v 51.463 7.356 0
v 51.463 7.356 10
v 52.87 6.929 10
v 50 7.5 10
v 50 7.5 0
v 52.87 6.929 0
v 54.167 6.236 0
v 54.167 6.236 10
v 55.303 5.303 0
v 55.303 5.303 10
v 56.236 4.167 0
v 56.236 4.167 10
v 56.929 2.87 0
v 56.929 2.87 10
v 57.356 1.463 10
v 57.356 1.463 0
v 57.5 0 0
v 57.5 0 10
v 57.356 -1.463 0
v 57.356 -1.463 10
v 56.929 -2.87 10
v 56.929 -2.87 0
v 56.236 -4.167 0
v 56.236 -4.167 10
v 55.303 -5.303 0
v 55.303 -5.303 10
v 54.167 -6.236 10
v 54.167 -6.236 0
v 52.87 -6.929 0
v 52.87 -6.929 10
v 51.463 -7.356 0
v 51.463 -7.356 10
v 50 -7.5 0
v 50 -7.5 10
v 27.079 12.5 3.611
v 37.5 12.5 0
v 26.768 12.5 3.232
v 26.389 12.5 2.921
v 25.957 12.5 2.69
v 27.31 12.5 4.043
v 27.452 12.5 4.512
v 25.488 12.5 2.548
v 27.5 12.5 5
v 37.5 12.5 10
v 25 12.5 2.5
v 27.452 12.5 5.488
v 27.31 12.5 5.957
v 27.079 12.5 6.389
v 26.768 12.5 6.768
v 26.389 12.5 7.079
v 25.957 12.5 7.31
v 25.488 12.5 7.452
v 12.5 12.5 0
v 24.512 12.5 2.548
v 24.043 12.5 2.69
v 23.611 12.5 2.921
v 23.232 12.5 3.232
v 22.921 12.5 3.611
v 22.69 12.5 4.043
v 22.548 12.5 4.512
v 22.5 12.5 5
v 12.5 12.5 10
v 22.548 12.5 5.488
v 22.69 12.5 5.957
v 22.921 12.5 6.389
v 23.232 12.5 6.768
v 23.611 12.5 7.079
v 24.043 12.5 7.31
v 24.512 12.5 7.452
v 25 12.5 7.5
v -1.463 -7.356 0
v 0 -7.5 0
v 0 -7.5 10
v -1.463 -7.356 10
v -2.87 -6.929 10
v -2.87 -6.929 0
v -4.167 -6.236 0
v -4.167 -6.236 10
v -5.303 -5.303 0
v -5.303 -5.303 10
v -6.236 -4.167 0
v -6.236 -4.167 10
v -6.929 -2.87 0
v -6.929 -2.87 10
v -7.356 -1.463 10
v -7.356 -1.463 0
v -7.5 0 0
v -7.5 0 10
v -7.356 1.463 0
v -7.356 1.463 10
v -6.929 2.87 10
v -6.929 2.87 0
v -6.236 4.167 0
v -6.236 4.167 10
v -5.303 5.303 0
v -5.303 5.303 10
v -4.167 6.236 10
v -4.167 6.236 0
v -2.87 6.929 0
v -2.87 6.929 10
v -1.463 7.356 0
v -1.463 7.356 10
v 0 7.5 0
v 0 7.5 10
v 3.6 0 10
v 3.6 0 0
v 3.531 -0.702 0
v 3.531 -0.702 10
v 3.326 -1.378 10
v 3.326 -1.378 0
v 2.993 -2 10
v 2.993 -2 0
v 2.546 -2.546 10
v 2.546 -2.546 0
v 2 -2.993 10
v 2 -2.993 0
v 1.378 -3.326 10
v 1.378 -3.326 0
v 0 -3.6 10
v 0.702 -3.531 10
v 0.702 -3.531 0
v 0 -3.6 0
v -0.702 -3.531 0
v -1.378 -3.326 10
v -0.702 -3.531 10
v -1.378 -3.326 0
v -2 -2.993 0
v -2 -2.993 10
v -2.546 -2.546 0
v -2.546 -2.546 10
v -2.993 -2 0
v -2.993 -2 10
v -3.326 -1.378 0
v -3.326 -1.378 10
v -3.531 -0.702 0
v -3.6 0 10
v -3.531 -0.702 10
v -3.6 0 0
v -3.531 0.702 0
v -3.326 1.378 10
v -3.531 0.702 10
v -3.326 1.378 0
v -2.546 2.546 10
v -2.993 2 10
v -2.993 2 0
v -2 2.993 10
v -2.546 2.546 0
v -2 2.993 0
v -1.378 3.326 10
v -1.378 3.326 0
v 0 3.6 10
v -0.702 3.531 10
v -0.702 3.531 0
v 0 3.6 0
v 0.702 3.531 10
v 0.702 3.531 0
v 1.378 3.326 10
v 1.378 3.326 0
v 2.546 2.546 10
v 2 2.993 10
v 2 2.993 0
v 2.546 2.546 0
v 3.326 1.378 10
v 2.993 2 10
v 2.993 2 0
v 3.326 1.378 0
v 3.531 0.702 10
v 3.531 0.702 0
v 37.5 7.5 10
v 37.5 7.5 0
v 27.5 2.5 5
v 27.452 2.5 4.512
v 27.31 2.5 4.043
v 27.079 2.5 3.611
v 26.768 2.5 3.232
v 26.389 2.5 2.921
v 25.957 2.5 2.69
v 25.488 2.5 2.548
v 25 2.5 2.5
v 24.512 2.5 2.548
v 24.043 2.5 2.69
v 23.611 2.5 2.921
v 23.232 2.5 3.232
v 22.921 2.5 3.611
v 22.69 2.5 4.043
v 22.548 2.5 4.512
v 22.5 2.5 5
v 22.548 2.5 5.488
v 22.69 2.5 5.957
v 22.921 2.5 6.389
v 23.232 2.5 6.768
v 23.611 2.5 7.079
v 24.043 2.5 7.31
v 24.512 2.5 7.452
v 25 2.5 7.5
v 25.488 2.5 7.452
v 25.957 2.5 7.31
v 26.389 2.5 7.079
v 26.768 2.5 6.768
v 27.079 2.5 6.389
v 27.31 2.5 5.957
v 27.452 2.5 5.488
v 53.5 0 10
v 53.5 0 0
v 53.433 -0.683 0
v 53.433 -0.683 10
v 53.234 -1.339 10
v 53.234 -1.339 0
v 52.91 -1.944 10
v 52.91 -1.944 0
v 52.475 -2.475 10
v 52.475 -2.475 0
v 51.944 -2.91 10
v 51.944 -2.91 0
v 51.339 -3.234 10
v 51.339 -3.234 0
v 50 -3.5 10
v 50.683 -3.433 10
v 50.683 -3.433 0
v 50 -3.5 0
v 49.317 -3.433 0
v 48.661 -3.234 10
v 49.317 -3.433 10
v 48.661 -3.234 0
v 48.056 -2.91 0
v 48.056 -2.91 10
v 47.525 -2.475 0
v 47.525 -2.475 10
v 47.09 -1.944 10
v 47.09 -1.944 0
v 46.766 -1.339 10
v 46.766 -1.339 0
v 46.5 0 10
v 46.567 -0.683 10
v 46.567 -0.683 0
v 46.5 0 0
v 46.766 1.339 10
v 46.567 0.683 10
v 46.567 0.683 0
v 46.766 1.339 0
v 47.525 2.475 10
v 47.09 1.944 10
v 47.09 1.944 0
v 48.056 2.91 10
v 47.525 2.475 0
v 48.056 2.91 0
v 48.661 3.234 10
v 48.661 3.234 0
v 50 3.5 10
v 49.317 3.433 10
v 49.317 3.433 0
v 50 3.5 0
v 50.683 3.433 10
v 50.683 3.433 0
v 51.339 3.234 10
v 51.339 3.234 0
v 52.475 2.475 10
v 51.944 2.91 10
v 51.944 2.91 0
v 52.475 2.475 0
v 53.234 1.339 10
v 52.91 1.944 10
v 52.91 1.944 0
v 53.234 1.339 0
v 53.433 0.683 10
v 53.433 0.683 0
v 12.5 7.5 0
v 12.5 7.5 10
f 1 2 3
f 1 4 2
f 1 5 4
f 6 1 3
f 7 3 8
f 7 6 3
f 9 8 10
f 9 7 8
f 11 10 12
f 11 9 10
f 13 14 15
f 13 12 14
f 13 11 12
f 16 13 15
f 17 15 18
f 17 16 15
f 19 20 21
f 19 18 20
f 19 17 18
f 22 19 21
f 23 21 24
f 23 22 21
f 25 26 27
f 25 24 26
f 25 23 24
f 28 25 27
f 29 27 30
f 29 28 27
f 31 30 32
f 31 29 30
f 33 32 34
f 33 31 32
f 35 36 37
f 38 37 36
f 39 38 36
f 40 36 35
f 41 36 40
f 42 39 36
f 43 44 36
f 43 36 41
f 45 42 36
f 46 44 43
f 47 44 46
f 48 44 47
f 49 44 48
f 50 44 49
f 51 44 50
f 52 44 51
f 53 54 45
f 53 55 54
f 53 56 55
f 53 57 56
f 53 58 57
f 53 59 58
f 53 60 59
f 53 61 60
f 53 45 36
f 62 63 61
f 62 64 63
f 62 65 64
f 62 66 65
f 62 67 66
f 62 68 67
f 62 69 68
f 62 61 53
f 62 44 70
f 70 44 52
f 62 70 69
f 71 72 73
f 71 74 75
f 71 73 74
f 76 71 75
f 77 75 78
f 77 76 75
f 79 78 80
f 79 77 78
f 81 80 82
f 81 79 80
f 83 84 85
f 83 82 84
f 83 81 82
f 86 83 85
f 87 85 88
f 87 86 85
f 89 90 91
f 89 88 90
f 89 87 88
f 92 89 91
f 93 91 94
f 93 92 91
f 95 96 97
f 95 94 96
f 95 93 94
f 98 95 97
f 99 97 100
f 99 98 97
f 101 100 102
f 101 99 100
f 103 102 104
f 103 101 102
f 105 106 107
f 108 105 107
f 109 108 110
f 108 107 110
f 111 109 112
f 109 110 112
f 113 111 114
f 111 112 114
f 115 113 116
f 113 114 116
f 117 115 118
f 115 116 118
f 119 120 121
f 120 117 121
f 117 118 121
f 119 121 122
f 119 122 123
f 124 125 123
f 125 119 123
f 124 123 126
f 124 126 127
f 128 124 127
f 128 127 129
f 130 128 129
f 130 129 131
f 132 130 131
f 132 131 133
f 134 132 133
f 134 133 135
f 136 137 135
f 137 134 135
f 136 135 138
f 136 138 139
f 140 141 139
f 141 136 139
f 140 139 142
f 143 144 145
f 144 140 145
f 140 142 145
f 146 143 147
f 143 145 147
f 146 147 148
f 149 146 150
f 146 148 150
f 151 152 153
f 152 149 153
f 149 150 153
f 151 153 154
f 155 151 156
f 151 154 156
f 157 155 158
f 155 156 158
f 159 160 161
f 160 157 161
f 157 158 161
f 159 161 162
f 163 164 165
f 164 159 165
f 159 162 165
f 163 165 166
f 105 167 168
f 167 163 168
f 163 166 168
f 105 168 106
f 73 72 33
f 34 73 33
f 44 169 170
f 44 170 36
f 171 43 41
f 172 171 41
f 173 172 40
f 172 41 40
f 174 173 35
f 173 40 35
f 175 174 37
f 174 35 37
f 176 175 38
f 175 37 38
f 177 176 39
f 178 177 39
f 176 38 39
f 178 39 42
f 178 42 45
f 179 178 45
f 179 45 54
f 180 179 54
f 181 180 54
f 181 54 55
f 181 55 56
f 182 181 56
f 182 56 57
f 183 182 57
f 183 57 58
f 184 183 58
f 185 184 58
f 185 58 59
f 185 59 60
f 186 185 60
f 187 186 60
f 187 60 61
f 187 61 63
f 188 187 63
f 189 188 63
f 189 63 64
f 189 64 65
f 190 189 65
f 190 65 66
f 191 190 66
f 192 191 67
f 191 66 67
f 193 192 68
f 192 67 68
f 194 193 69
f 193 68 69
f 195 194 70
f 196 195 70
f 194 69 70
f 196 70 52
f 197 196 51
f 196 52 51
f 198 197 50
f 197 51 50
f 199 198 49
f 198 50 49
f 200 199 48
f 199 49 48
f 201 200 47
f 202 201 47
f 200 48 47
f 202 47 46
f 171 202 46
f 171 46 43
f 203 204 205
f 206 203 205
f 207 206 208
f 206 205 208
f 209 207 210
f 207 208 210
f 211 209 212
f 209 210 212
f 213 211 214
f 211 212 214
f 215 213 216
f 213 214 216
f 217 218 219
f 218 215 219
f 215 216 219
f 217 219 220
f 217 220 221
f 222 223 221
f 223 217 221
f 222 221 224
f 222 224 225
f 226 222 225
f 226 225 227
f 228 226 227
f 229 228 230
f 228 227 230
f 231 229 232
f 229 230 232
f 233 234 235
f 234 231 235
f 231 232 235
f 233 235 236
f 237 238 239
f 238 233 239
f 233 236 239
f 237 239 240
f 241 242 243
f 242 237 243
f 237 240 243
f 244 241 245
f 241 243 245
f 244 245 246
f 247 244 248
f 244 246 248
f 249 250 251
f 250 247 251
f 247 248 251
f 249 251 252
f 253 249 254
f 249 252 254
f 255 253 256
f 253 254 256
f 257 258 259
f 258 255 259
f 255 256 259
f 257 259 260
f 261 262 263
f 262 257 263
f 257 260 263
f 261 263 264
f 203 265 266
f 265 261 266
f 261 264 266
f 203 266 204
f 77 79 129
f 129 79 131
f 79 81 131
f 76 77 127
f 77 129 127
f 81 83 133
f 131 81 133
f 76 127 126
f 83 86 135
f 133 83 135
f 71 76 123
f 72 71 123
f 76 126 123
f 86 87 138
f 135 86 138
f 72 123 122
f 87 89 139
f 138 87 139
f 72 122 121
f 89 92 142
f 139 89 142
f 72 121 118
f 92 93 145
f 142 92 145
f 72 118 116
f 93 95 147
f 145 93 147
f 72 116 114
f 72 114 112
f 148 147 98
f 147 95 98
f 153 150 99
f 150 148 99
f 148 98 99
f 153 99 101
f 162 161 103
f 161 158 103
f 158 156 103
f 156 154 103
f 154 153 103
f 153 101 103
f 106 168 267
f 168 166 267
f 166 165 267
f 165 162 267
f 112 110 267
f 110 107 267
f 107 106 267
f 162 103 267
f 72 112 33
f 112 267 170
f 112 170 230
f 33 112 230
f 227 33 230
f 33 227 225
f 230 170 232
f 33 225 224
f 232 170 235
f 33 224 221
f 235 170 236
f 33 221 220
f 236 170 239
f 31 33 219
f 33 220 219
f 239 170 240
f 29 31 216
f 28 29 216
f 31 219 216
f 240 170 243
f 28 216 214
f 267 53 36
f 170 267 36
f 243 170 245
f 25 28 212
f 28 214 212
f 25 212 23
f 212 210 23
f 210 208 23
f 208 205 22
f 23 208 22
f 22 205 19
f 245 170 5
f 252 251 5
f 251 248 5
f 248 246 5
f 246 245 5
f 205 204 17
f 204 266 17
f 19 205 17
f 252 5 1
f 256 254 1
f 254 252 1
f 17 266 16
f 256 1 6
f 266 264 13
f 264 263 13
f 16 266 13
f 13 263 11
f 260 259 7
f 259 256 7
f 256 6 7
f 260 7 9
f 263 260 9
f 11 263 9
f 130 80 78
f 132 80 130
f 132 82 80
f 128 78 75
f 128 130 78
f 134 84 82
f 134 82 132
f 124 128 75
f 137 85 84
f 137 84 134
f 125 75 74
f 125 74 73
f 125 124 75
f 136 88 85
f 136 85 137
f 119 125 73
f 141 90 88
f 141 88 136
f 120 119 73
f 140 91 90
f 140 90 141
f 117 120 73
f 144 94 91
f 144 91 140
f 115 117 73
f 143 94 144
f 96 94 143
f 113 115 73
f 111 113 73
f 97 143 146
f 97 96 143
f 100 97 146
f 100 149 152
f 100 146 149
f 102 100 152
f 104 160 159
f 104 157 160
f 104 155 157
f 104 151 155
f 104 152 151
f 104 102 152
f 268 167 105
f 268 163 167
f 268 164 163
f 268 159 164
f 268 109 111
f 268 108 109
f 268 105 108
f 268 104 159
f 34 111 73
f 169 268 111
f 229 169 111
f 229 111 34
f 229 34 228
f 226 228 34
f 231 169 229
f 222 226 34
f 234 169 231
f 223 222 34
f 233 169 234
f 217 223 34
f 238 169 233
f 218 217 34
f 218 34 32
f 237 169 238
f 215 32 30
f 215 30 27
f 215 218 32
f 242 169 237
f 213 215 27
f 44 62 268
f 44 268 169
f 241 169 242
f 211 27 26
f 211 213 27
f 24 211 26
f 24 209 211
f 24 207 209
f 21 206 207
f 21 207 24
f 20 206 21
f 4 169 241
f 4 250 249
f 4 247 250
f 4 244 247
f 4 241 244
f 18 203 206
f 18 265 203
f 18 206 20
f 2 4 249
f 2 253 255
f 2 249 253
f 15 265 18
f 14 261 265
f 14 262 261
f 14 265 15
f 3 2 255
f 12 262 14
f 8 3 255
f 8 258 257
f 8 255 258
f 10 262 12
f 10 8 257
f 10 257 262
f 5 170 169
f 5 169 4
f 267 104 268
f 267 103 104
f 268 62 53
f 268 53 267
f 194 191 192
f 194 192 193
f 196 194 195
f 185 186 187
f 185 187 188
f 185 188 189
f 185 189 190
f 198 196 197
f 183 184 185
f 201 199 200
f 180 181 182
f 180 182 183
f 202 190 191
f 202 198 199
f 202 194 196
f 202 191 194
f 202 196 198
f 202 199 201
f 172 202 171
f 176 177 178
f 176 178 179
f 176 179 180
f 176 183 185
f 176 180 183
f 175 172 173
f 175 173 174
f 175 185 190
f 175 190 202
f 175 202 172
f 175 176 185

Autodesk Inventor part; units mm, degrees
ref_plane "YZ Plane" through (0, 0, 0) normal (1, 0, 0) x (0, 1, 0)
ref_plane "XZ Plane" through (0, 0, 0) normal (0, 1, 0) x (-1, 0, 0)
ref_plane "XY Plane" through (0, 0, 0) normal (0, 0, 1) x (1, 0, 0)
sketch "Sketch1" plane through (0, 0, 0) normal (0, 0, 1) x (1, 0, 0)
  circle A0 centre (0, 0) radius 3.6
  circle A1 centre (0, 0) radius 7.5 construction
  arc A2 (0, 7.5) -> (0, -7.5) centre (0, 0) ccw
  line L0 (0, 7.5) -> (50, 7.5)
  line L1 (0, -7.5) -> (50, -7.5)
  circle A3 centre (50, 0) radius 7.5 construction
  arc A4 (50, -7.5) -> (50, 7.5) centre (50, 0) ccw
  circle A5 centre (50, 0) radius 3.5
  point P0 (42.6287, 1.3837)
  point P1 (42.5553, -0.9092)
  dimension "d0" = 7.2
  dimension "d1" = 15
  dimension "d2" = 50
  dimension "d3" = 15
  dimension "d4" = 7
extrude "Extrusion1" add sketch "Sketch1" along normal blind 10
sketch "Sketch4" plane through (0, 0, 10) normal (0, 0, 1) x (1, 0, 0)
  line L0 (50, 7.5) -> (0, 7.5) projected
  line L1 (12.5, 7.5) -> (37.5, 7.5)
  line L2 (37.5, 7.5) -> (37.5, 12.5)
  line L3 (37.5, 12.5) -> (12.5, 12.5)
  line L4 (12.5, 12.5) -> (12.5, 7.5)
  point P0 (0, 0)
  point P1 (25, 7.5)
  dimension "d10" = 25
  dimension "d11" = 5
extrude "Extrusion3" add sketch "Sketch4" against normal blind 10
sketch "Sketch5" plane through (12.5, 12.5, 10) normal (0, 1, 0) x (1, 0, 0)
  line L0 (25, 0) -> (0, 0) projected
  line L1 (25, 0) -> (25, 10) projected
  line L2 (0, 10) -> (25, 10) projected
  line L3 (0, 0) -> (0, 10) projected
  circle A0 centre (12.5, 5) radius 2.5
  line L4 (0, 0) -> (0, 10) projected
  point P0 (-12.5, 10)
  point P1 (12.5, 10)
  point P2 (0, 5)
  dimension "d14" = 5
extrude "Extrusion4" cut sketch "Sketch5" against normal blind 10 contours A0
properties part number "GA003" material "ABS Plastic"
